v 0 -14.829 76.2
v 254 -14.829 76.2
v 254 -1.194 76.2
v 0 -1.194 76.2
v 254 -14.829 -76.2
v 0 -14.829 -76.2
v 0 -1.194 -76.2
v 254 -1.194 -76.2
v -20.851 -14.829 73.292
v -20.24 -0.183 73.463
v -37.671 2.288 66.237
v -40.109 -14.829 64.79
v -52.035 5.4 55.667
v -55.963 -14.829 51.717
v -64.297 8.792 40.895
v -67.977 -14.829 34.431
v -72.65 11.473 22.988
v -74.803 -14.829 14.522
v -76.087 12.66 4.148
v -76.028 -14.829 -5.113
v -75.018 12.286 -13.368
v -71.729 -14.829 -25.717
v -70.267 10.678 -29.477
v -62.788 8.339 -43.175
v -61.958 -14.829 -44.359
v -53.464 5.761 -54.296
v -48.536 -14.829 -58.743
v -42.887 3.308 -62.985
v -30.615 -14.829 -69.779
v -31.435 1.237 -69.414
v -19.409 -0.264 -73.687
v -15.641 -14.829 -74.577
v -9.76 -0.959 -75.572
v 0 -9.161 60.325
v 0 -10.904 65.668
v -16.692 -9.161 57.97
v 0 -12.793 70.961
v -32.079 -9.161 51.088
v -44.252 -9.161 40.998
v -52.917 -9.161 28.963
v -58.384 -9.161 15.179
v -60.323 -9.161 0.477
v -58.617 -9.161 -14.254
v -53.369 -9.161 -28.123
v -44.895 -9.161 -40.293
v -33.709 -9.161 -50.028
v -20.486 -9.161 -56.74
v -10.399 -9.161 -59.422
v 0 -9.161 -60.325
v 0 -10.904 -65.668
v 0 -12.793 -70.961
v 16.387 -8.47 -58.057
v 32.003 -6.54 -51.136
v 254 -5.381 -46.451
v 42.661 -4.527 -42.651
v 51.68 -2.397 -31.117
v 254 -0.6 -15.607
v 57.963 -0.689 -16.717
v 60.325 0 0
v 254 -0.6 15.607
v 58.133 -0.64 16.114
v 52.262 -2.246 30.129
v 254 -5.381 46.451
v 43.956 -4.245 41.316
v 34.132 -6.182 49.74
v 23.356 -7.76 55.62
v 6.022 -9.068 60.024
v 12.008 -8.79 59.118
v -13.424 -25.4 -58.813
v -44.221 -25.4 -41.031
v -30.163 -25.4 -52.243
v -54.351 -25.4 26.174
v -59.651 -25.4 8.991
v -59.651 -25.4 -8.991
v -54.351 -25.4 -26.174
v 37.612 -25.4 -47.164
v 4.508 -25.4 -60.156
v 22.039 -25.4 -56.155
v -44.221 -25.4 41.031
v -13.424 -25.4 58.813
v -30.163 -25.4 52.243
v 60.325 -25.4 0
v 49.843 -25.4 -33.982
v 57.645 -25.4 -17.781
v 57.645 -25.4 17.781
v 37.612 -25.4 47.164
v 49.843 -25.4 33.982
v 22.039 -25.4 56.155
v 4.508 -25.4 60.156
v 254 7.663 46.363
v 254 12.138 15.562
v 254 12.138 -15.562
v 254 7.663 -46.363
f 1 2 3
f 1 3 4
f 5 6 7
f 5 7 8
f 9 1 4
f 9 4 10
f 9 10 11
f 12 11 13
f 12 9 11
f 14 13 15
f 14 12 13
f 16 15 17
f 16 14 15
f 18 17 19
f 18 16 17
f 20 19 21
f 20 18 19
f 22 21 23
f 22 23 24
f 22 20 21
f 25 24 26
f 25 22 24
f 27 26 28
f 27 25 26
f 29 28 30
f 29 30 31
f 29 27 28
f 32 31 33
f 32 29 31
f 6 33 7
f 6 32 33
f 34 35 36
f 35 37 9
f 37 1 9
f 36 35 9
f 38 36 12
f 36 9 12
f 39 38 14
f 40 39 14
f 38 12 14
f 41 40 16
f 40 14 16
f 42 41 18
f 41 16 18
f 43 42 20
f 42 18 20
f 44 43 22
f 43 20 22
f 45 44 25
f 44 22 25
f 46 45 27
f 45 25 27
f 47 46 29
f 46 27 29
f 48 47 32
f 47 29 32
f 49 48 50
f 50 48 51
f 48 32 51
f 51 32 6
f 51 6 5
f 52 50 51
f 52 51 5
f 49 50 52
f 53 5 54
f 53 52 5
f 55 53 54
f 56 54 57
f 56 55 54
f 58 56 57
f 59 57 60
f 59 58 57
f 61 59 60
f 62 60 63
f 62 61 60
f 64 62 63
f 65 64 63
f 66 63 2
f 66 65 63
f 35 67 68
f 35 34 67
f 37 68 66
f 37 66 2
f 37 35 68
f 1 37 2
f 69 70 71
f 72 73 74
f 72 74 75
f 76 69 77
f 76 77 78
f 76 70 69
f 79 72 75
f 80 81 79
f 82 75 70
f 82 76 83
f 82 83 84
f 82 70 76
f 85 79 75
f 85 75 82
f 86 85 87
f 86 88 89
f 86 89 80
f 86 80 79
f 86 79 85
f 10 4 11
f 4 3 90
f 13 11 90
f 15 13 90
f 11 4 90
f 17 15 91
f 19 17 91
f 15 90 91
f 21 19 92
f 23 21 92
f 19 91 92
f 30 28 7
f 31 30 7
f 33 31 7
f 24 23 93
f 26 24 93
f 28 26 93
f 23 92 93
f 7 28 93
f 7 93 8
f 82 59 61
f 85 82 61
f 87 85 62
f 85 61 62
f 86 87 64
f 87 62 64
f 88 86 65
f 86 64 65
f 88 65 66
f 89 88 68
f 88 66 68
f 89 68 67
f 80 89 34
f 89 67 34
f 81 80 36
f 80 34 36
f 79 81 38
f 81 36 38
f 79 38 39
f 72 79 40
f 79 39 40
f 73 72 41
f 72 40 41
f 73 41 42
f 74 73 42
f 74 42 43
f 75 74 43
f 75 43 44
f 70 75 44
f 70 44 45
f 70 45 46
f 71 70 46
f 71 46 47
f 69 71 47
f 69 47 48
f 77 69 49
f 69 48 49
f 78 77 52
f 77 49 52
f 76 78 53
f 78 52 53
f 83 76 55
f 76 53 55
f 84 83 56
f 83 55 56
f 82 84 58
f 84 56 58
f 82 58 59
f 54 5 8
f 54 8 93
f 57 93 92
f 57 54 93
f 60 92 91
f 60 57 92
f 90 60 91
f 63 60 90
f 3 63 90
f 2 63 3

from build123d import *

# Parameters (mm, degrees)
F0_R     = 60.325
F1_DEPTH = 19.05
F4_ANGLE = -180
F2_R     = 203.2
F5_DEPTH = 492.64856
F6_DEPTH = 285.85777
F7_DEPTH = 25.4


with BuildPart() as f1:
    # F0 (on Front) → F1 (new body, symmetric)
    with BuildSketch(Plane.XZ):
        with BuildLine():
            Line((254, 76.2), (0, 76.2))
            ThreePointArc((0, 76.2), (-76.2, 0), (0, -76.2))
            Line((0, -76.2), (254, -76.2))
            Line((254, -76.2), (254, 76.2))
        make_face()
        Circle(F0_R, mode=Mode.SUBTRACT)
        Circle(F0_R)
    extrude(amount=F1_DEPTH, both=True)

    # F3 (on face) → F4 (revolve, cut)
    with BuildSketch(Plane.YZ):
        with BuildLine():
            Line((-406.4, 0), (0, 0))
            ThreePointArc((0, 0), (-203.2, 203.2), (-406.4, 0))
        make_face()
    revolve(axis=Axis((0, -203.2, 0), (0, 1, 0)), revolution_arc=F4_ANGLE, mode=Mode.SUBTRACT)

    # F2 (on Right) → F5 (cut)
    with BuildSketch(Plane.YZ):
        with Locations((-203.2, 0)):
            Circle(F2_R)
    extrude(amount=F5_DEPTH, mode=Mode.SUBTRACT)

    # F2 (on Right) → F6 (cut, symmetric)
    with BuildSketch(Plane.YZ):
        with BuildLine():
            ThreePointArc((-13.238437, 102.60319), (12.640691, -5.060247), (-18.255432, -111.392625))
            Line((-18.255432, -111.392625), (114.283874, -111.392625))
            Line((114.283874, -111.392625), (114.283874, 102.60319))
            Line((114.283874, 102.60319), (-13.238437, 102.60319))
        make_face()
    extrude(amount=F6_DEPTH, both=True, mode=Mode.SUBTRACT)

    # F0 (on Front) → F7 (join)
    with BuildSketch(Plane.XZ):
        Circle(F0_R)
    extrude(amount=F7_DEPTH)


solid = f1.part
